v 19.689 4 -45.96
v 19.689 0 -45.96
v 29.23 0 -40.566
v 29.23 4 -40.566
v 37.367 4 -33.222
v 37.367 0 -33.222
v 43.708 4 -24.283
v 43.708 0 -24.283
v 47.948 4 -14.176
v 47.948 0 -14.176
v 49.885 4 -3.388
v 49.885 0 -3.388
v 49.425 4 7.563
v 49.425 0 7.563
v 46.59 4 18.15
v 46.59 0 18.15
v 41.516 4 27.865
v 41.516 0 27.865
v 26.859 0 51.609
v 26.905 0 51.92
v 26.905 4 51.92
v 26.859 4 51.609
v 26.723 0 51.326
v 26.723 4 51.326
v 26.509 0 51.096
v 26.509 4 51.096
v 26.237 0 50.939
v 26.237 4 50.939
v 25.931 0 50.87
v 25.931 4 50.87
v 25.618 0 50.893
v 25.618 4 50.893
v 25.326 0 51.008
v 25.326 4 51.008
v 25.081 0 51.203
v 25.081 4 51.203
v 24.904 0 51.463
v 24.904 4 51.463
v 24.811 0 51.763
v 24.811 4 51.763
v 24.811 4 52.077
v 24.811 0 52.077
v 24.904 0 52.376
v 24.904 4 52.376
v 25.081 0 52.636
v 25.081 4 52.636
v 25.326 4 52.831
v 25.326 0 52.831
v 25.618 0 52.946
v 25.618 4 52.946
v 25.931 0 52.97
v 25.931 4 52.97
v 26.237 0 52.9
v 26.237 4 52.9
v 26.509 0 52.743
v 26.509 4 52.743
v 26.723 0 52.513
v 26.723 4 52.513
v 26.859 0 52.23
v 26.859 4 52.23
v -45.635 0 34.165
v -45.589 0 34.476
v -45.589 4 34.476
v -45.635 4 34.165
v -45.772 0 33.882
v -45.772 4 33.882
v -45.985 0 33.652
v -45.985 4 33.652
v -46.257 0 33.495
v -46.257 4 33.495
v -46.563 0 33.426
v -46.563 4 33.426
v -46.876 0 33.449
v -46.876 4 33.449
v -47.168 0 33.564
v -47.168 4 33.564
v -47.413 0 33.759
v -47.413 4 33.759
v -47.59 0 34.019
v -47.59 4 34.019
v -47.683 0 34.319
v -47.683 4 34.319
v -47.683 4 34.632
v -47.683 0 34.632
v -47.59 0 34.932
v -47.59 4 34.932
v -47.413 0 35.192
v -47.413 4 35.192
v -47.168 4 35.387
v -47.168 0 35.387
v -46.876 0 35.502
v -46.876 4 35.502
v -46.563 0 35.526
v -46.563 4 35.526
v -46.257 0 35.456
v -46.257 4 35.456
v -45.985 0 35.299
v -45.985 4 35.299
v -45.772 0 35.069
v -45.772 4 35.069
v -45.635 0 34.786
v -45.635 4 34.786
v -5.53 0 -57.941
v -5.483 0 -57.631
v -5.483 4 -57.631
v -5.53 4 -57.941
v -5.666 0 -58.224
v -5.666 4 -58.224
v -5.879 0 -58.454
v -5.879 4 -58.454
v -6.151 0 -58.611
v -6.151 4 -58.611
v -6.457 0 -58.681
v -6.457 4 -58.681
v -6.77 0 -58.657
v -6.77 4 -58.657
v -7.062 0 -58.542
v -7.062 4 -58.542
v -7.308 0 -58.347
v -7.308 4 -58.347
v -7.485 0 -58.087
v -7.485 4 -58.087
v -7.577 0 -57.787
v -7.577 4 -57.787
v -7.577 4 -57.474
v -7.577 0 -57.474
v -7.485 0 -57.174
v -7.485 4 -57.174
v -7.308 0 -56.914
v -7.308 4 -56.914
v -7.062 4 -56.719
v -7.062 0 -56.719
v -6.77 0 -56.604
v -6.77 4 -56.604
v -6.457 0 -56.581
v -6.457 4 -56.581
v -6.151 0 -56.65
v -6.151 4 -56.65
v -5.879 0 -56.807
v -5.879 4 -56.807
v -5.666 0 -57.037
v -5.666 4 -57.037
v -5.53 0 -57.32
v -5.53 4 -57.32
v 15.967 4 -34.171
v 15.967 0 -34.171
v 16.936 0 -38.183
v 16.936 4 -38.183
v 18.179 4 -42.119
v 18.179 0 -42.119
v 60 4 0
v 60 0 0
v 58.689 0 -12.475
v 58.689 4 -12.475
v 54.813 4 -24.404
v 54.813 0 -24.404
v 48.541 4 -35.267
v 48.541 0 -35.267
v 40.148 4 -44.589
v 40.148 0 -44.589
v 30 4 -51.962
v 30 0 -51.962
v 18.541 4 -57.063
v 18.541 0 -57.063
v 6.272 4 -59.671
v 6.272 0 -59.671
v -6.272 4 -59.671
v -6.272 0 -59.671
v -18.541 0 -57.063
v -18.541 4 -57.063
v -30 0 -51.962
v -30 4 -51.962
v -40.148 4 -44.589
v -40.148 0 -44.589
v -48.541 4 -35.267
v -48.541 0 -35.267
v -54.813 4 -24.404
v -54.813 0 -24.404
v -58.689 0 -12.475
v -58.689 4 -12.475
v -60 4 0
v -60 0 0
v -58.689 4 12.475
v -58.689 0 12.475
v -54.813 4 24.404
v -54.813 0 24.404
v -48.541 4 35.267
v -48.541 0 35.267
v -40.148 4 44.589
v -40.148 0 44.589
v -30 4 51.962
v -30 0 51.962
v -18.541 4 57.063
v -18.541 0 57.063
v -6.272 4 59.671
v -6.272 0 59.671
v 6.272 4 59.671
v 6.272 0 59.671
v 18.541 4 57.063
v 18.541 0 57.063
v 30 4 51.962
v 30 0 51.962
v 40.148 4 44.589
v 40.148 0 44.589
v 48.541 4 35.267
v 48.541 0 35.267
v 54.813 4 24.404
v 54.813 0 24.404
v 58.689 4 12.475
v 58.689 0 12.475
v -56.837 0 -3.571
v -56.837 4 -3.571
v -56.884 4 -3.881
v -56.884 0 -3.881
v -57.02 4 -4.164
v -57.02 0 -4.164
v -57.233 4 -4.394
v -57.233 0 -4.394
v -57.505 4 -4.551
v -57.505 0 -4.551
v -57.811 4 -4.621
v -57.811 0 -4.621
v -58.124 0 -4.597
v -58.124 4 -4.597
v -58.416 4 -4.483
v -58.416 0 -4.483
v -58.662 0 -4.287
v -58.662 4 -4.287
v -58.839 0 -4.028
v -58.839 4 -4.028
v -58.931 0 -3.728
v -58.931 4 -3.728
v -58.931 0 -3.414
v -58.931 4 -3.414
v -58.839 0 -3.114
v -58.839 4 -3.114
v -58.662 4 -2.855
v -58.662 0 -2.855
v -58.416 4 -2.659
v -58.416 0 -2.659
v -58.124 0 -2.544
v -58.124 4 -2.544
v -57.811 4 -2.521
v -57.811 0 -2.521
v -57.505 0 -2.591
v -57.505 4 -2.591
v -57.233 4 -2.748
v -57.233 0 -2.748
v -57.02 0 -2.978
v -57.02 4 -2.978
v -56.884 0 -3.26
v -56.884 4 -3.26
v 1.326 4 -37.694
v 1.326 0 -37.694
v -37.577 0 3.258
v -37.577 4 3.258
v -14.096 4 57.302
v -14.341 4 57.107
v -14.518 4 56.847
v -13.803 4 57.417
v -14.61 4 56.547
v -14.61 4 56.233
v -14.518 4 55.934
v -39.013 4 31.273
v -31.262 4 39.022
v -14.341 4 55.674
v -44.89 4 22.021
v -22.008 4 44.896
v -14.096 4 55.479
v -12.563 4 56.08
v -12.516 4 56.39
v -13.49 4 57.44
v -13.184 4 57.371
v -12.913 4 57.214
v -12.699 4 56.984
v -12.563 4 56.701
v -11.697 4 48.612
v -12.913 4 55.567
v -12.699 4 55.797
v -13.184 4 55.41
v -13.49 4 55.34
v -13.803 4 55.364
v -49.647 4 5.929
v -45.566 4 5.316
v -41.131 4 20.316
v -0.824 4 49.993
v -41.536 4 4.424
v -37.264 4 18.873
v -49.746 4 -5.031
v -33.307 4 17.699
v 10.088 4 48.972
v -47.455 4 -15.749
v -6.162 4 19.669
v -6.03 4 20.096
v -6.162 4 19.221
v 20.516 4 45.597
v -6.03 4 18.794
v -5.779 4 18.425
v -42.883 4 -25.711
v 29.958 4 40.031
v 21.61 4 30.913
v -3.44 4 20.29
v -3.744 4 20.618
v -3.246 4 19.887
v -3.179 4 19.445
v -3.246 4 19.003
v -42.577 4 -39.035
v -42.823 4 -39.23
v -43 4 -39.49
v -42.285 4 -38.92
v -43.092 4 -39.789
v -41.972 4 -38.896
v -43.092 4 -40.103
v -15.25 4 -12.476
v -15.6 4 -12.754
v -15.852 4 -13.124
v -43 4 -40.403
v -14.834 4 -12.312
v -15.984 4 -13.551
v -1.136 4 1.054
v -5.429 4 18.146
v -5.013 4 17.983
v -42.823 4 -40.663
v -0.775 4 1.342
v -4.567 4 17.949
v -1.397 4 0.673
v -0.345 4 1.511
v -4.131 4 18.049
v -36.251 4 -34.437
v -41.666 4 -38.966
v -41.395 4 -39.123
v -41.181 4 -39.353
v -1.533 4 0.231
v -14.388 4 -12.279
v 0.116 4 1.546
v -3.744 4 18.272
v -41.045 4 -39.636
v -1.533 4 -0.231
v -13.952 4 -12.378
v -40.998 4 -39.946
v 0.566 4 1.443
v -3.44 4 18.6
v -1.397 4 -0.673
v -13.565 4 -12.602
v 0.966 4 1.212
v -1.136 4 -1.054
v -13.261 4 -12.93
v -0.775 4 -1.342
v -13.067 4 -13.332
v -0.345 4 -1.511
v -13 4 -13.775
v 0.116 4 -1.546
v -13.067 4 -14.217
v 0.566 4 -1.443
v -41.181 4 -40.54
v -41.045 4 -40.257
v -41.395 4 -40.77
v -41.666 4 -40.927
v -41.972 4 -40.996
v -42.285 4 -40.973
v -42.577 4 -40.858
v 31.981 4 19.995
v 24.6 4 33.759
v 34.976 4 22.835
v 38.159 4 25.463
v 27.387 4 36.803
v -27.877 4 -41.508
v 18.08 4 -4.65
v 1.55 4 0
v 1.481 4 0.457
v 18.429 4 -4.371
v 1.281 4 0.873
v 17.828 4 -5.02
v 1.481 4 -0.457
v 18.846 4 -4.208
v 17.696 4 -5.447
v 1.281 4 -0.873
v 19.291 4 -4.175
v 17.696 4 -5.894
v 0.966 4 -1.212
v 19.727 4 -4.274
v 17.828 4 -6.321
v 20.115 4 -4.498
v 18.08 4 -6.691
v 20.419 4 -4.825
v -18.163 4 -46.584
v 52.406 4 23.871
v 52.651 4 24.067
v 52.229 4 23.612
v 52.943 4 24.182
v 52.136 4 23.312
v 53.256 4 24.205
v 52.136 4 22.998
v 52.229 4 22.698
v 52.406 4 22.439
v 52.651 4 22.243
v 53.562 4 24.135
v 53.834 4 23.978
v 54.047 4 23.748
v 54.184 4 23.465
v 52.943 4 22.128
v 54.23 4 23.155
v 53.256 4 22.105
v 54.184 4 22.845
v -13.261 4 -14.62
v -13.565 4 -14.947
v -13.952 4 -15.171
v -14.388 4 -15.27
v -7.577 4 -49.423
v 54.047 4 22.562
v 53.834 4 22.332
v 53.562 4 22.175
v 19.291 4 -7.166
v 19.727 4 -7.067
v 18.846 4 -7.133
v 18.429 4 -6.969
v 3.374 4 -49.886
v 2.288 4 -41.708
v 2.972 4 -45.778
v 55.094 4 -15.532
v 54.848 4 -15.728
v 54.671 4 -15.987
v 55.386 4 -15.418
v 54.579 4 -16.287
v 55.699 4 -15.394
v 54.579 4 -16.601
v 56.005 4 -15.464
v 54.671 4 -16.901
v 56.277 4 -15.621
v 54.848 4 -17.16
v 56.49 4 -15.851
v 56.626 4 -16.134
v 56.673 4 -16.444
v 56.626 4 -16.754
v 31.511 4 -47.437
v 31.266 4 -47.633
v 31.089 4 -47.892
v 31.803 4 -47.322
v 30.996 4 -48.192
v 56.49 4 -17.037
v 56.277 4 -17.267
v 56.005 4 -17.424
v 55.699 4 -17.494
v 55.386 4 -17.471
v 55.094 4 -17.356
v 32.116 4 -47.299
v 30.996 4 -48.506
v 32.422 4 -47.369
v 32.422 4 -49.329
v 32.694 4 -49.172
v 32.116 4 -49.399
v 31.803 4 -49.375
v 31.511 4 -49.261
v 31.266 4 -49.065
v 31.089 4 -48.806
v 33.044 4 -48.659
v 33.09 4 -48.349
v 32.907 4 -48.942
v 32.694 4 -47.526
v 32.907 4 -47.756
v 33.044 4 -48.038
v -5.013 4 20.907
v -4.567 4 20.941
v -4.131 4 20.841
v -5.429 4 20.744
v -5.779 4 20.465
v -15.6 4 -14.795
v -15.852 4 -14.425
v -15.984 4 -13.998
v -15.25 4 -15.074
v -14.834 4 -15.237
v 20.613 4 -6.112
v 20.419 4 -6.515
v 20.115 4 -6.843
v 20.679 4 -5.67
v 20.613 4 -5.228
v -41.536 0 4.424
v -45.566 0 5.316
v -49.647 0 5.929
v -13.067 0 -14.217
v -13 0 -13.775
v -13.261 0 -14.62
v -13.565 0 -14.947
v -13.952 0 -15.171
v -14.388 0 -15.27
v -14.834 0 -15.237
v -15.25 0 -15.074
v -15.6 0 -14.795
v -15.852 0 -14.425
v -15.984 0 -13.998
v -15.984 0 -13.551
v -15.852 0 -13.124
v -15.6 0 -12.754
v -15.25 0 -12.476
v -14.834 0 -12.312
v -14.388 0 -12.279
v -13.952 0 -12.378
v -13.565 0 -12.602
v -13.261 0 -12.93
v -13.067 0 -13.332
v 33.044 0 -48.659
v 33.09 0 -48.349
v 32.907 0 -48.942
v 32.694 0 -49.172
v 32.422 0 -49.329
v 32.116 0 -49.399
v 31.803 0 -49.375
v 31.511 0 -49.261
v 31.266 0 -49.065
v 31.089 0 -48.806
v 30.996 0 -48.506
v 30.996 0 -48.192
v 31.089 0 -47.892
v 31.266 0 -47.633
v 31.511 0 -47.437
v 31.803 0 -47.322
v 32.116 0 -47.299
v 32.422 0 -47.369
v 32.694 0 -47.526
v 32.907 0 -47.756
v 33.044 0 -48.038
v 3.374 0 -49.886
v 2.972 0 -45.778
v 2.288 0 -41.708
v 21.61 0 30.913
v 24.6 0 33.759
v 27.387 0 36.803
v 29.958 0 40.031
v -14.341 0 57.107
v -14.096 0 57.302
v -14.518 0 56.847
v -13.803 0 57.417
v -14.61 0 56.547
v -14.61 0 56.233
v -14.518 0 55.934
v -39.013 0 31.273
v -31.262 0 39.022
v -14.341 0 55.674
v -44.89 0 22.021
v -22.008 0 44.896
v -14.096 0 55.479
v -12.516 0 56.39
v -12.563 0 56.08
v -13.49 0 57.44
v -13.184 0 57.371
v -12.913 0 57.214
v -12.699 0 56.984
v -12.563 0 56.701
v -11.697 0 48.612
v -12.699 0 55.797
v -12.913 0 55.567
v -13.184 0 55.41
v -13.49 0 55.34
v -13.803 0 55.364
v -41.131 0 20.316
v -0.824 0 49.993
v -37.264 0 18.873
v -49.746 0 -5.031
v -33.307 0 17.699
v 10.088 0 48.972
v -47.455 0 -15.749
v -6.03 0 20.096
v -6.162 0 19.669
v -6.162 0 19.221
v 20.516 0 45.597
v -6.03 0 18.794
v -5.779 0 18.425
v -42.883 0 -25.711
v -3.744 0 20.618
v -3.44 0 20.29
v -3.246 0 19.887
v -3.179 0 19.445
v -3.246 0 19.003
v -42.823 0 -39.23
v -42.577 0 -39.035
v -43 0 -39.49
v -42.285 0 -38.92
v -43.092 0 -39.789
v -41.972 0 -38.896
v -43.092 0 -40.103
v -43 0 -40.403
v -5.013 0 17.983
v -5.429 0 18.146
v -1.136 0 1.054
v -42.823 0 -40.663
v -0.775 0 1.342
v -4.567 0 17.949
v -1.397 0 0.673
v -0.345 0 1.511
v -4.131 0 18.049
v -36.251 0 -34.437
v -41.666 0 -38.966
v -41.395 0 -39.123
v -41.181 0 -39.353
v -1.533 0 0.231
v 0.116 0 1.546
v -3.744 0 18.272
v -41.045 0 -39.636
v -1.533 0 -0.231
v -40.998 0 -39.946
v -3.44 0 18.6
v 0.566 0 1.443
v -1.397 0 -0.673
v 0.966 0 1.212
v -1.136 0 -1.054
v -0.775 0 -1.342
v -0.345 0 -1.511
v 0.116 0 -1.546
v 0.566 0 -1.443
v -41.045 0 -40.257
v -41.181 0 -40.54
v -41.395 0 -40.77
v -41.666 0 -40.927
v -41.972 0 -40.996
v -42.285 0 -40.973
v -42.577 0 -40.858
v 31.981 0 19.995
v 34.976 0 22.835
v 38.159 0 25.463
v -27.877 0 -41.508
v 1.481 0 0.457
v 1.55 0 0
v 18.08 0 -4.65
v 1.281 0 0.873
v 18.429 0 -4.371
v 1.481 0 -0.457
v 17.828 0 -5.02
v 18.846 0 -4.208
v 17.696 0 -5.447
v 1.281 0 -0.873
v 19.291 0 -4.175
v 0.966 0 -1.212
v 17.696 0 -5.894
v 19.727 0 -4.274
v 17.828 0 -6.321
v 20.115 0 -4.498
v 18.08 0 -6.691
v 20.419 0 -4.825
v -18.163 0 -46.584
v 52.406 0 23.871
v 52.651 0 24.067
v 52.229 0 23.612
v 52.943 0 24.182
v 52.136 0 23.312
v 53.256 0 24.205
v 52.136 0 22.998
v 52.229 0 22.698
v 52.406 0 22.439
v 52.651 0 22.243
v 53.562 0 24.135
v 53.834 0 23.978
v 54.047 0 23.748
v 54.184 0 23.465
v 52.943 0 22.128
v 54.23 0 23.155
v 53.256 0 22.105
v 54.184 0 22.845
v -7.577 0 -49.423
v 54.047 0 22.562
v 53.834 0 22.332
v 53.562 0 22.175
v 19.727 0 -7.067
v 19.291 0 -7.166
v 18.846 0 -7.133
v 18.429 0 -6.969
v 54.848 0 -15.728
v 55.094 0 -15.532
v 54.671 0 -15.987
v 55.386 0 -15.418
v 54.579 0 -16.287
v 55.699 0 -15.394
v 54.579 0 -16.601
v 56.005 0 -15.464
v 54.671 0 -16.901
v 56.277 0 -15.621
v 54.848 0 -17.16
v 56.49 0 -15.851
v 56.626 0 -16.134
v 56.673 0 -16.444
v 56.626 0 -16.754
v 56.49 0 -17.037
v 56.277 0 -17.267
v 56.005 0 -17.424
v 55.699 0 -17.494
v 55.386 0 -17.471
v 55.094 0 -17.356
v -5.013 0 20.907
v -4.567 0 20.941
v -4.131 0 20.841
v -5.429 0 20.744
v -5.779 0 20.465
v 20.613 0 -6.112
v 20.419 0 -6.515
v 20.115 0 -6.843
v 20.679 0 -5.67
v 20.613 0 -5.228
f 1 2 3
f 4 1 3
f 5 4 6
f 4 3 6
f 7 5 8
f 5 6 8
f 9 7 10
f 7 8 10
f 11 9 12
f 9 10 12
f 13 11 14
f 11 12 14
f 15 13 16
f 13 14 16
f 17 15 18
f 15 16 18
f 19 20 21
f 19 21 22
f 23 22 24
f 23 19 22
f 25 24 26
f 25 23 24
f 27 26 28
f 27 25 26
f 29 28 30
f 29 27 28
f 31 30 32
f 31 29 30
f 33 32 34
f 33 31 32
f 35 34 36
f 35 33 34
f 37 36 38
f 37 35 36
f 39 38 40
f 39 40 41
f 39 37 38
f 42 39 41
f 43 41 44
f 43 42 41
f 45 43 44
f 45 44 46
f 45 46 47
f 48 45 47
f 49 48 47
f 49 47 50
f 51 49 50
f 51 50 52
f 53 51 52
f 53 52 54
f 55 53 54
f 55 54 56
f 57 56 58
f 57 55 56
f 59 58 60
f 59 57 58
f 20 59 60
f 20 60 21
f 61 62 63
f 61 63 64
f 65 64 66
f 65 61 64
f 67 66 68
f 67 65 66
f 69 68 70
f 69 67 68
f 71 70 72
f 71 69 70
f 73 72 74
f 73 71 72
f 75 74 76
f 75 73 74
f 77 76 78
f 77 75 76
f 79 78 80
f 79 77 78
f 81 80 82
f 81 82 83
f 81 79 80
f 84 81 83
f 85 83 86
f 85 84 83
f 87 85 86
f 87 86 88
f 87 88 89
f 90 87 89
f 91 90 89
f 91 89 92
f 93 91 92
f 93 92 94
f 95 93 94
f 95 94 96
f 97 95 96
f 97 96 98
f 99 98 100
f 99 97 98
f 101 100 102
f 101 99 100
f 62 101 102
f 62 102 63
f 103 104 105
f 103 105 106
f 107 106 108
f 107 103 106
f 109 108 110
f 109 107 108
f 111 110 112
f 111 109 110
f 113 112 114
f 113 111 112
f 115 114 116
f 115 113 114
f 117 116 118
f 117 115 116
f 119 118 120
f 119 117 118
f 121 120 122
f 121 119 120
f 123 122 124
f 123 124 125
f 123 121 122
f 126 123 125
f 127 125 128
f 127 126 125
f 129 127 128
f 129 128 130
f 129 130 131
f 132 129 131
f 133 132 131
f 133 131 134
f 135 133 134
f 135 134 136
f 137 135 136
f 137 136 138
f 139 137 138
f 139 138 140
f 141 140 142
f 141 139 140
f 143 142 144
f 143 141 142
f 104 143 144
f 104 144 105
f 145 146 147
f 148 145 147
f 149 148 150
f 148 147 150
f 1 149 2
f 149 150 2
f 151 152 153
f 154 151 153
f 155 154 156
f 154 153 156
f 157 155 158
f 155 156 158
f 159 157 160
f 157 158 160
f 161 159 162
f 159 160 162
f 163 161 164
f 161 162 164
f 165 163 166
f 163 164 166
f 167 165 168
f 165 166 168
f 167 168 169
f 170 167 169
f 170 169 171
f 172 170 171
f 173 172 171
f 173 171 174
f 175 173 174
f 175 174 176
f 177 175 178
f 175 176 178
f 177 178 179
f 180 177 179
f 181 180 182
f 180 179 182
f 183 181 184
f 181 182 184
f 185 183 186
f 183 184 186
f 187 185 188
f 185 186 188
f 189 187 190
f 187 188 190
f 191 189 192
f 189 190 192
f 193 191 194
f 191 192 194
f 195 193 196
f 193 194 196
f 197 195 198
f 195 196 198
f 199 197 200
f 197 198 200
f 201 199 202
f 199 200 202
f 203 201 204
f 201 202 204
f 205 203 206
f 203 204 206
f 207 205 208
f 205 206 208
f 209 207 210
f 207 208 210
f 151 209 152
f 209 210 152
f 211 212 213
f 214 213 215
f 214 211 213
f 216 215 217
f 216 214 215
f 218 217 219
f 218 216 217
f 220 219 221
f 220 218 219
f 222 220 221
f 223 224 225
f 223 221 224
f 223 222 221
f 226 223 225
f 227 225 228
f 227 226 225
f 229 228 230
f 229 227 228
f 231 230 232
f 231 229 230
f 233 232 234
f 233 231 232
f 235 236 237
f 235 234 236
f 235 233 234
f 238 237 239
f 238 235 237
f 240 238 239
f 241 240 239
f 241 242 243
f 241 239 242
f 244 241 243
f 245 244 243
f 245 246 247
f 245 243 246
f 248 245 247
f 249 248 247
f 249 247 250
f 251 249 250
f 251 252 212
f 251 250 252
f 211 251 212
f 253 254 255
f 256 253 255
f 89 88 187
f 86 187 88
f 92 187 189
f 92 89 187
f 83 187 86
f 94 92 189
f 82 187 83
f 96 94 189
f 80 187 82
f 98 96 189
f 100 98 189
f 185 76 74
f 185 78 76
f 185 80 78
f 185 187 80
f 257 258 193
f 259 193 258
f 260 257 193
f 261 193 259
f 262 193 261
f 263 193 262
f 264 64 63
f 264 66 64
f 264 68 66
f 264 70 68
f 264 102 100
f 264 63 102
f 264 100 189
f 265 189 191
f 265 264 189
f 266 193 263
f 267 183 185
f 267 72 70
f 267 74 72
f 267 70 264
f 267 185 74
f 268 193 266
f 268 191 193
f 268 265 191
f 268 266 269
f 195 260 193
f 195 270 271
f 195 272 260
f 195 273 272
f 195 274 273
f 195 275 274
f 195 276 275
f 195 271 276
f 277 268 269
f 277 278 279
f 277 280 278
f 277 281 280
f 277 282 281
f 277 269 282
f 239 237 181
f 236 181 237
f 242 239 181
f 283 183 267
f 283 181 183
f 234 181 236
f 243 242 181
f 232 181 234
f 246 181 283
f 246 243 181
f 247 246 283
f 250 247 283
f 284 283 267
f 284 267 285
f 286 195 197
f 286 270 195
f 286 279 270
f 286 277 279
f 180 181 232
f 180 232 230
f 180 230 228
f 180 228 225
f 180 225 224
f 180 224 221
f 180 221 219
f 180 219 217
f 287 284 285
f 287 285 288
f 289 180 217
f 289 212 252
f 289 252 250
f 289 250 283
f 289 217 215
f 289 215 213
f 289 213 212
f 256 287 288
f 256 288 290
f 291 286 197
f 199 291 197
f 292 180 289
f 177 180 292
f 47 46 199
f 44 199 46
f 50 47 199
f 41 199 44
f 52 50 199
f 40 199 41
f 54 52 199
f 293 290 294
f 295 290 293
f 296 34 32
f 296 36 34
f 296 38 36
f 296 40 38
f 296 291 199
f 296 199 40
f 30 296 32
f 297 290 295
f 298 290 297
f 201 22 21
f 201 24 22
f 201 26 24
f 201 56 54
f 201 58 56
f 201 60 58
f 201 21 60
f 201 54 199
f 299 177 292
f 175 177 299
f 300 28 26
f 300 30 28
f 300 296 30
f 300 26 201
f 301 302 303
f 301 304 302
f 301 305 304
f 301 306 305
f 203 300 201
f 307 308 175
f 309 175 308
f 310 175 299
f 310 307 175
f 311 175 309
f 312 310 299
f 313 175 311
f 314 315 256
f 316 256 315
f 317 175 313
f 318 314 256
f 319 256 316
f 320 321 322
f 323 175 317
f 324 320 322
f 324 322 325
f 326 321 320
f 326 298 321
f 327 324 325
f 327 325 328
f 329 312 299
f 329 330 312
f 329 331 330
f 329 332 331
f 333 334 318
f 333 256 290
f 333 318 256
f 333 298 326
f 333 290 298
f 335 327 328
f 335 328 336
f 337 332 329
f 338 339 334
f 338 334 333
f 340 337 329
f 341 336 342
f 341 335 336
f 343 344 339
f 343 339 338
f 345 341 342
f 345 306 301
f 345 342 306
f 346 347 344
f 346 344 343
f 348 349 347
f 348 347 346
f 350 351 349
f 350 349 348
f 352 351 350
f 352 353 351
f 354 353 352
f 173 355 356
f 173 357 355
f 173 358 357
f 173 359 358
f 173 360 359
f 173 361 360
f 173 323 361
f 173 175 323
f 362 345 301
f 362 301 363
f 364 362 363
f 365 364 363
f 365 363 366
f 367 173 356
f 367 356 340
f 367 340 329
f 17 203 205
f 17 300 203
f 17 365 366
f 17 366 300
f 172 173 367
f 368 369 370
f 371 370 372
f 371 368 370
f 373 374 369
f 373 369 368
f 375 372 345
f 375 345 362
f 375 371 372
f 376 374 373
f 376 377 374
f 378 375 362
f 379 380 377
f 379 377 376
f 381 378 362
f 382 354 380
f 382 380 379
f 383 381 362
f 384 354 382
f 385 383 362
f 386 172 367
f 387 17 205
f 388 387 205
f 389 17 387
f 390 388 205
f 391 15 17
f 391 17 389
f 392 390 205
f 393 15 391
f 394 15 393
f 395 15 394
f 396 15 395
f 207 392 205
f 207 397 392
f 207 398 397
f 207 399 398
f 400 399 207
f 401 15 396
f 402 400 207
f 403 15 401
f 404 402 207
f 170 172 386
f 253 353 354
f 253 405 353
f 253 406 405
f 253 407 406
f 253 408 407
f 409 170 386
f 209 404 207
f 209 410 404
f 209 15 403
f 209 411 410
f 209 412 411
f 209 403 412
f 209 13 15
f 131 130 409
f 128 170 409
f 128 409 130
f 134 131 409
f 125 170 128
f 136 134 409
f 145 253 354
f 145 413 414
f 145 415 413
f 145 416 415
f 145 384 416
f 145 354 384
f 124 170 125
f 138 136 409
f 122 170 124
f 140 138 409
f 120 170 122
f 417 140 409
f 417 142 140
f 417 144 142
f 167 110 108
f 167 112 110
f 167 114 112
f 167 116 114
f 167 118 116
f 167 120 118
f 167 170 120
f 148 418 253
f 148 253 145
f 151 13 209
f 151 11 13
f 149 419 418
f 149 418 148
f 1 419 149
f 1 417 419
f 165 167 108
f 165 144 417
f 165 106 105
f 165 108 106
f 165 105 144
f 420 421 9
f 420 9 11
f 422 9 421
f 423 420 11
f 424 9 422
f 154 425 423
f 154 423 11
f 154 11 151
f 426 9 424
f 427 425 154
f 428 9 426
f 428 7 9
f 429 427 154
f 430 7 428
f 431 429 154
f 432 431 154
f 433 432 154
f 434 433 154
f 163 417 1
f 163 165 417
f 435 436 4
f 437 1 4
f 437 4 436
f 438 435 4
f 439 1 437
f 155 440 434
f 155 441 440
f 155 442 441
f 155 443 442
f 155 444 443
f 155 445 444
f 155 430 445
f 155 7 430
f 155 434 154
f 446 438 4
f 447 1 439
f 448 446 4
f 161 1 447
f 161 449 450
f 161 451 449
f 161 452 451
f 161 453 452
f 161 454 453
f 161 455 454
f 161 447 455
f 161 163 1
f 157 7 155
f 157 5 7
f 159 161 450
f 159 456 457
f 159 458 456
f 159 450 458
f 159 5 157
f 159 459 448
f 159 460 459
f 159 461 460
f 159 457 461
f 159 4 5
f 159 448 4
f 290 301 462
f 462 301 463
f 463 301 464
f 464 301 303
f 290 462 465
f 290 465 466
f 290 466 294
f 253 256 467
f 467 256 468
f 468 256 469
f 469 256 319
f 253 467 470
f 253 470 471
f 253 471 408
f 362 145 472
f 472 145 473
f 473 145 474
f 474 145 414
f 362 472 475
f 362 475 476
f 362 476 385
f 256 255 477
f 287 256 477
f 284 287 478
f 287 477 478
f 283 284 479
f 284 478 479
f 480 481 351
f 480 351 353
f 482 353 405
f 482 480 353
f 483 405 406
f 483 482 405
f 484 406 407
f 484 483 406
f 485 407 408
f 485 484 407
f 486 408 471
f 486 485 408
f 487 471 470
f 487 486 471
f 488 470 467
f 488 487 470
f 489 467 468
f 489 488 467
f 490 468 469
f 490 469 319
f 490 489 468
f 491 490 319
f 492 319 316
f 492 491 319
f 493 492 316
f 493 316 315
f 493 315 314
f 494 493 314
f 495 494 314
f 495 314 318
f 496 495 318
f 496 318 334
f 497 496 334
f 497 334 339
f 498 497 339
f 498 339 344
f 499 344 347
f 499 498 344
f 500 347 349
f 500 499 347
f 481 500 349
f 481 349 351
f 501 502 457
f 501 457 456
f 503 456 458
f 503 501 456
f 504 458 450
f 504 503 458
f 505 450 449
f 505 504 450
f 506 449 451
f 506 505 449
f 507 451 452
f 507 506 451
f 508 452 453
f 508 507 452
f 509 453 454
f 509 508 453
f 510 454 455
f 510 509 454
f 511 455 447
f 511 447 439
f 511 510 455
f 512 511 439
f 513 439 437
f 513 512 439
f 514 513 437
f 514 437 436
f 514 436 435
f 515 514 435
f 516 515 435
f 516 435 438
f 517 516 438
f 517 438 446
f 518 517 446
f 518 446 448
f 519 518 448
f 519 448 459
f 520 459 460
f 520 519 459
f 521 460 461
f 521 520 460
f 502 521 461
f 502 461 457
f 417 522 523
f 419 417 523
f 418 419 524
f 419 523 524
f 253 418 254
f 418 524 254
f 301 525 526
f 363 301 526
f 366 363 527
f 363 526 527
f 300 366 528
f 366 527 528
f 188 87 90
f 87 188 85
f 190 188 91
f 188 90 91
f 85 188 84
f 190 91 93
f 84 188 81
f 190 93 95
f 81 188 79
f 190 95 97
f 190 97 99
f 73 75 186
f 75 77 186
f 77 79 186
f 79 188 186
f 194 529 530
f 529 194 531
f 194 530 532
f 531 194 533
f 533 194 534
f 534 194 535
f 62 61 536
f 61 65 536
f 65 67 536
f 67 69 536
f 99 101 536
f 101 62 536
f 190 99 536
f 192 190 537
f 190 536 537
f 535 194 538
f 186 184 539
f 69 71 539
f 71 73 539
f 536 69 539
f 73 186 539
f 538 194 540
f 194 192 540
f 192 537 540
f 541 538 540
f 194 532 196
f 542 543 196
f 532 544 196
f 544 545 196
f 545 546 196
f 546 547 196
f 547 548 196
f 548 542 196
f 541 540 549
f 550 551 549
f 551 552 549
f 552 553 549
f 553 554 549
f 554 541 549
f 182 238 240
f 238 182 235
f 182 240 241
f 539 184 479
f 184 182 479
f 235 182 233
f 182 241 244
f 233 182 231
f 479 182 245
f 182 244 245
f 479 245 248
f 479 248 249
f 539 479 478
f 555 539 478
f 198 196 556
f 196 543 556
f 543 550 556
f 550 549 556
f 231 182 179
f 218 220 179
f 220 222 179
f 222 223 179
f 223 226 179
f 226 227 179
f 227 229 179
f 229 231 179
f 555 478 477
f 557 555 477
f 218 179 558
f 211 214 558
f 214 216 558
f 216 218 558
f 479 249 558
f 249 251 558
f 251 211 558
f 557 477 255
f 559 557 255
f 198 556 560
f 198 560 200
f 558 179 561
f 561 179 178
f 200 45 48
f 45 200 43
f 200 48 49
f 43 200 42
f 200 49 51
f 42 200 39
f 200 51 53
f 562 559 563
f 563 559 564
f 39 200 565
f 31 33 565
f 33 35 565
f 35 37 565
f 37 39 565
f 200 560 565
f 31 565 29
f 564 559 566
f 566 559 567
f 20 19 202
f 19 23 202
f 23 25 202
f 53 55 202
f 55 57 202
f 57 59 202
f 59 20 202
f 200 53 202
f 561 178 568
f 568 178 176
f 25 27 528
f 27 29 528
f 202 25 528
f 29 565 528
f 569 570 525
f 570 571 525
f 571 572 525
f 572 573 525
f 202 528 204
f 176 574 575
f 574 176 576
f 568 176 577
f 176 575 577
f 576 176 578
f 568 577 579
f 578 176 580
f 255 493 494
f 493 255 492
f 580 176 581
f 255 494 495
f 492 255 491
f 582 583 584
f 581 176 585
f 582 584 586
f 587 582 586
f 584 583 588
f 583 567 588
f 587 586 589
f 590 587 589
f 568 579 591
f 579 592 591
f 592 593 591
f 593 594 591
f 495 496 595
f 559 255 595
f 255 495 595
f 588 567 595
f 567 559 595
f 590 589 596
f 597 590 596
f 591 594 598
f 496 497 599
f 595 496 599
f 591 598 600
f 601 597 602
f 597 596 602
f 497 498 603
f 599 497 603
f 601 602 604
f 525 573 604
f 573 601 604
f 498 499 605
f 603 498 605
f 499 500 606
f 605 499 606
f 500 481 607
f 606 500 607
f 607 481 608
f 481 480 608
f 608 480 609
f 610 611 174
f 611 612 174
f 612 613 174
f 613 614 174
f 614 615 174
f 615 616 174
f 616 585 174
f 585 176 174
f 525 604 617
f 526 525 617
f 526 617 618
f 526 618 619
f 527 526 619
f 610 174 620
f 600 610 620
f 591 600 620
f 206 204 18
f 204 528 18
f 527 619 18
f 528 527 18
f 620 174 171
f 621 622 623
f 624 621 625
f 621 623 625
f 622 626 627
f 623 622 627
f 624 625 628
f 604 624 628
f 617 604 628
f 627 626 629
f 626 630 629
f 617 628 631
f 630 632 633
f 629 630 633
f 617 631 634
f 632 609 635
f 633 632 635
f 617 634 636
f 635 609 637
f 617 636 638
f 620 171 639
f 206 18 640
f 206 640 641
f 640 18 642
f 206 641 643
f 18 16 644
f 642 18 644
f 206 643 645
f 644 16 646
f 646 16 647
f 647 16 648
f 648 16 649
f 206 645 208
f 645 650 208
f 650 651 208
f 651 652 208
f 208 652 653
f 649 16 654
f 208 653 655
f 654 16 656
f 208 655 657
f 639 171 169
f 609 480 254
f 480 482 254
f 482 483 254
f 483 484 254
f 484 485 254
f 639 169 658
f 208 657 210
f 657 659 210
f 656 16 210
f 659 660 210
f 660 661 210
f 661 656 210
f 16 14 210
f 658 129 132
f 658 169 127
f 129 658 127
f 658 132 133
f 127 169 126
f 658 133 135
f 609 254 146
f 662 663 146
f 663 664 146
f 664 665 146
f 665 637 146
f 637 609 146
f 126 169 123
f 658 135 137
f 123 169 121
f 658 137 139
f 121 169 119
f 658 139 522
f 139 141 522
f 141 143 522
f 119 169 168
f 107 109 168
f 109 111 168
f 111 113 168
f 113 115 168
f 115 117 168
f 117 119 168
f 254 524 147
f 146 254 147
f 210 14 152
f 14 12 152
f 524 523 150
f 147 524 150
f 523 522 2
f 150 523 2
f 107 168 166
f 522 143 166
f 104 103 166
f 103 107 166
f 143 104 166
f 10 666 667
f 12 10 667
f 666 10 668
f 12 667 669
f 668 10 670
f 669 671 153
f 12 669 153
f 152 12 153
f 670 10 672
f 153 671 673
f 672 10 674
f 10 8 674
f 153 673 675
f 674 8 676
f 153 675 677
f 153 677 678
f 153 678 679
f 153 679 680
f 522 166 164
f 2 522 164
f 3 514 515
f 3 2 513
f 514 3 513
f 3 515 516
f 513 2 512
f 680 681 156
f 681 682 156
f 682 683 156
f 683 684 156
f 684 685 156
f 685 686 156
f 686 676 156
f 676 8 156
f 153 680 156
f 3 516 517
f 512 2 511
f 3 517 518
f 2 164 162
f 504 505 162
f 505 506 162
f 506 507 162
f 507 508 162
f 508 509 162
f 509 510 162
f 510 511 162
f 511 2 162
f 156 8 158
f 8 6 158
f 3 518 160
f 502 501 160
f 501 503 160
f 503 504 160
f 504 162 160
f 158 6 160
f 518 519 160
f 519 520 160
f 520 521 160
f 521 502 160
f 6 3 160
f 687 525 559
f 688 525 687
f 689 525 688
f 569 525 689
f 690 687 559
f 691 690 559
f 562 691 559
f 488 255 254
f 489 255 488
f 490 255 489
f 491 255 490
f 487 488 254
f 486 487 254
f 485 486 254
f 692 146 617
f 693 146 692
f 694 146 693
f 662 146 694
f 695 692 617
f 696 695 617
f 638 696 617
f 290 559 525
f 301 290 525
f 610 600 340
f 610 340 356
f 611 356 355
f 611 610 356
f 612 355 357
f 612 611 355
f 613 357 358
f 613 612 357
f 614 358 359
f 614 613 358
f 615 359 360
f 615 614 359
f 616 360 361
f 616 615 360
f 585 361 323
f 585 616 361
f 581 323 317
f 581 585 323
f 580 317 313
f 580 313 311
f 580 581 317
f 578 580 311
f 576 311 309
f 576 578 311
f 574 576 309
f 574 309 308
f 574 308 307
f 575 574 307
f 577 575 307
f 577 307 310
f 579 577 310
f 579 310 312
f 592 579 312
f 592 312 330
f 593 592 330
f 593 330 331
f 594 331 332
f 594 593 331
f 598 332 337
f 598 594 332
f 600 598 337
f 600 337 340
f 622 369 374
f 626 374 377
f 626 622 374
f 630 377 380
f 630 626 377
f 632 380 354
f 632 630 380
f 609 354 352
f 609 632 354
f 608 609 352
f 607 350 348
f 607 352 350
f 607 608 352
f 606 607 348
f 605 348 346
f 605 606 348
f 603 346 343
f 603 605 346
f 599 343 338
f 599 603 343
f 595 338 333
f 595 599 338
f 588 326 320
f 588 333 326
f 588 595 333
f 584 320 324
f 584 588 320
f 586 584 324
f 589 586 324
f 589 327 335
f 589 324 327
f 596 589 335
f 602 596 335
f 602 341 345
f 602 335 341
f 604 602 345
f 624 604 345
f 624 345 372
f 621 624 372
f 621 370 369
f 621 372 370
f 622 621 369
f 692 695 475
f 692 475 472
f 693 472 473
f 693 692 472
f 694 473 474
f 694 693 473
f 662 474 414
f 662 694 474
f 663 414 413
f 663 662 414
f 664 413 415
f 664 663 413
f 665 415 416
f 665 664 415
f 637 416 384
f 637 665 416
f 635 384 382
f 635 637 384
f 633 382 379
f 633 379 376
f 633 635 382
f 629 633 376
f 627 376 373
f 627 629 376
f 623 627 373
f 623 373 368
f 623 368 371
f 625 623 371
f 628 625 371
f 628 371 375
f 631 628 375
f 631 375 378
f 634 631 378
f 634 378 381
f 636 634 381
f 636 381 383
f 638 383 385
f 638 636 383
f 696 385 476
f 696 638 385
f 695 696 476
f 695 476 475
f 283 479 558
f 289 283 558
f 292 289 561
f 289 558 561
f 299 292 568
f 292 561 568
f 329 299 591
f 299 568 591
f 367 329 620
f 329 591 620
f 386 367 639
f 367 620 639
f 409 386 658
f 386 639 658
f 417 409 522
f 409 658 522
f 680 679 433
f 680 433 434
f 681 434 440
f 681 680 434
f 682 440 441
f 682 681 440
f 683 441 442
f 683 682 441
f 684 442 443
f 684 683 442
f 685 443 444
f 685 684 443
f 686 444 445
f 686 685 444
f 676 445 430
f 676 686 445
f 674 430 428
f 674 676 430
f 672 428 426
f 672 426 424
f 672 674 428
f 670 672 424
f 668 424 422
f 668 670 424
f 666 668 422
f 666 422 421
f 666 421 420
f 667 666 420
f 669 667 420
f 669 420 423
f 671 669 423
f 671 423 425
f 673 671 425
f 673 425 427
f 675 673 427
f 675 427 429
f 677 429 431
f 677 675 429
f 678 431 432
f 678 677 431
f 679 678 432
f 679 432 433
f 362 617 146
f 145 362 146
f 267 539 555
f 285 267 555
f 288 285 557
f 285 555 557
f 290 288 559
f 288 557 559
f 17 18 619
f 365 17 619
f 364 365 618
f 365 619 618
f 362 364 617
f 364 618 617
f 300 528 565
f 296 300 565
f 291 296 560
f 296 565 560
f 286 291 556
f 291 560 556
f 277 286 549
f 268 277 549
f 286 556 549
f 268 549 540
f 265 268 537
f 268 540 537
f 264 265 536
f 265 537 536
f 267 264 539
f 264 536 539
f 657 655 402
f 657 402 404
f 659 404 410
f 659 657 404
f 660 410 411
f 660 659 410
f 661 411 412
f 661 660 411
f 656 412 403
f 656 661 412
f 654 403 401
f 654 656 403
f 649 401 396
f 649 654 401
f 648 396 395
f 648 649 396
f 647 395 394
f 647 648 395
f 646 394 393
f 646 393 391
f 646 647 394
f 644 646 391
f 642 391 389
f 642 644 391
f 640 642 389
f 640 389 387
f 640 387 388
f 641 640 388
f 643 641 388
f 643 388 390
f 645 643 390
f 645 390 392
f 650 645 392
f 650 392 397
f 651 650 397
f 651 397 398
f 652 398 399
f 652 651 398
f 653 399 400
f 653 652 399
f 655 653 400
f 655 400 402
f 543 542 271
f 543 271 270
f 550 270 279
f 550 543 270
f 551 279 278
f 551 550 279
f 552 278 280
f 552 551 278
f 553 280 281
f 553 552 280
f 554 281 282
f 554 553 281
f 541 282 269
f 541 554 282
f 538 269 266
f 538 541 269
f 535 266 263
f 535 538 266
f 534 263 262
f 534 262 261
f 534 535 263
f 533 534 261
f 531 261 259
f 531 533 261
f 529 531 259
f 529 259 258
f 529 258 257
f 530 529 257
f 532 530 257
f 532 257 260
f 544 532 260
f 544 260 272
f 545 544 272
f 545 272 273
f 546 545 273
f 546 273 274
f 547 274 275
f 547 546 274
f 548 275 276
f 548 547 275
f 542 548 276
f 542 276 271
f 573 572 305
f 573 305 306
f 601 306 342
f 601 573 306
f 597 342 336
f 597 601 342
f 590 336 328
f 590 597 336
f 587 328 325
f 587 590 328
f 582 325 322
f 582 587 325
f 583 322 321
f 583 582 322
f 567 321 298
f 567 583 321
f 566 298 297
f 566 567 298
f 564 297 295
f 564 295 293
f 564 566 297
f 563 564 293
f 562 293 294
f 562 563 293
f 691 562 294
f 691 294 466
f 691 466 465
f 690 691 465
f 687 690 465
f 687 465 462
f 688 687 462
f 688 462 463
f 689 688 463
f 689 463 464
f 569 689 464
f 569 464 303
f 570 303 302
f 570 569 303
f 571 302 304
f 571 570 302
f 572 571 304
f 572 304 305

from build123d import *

# Parameters (mm, degrees)
SKETCH_3_R           = 60
SKETCH_3_R_2         = 1.052935028
SKETCH_3_R_3         = 1.5
EXTRUDE_4_DEPTH      = 4
CUT_EXTRUDE_15_DEPTH = 4
SKETCH_3_22_R        = 1.55
CUT_EXTRUDE_23_DEPTH = 10
SKETCH_3_23_R        = 1.052935028
CUT_EXTRUDE_24_DEPTH = 10


with BuildPart() as part:
    # 草图3 → 凸台-拉伸4 (new body)
    with BuildSketch(Plane(origin=(0, 0, 0), x_dir=(1, 0, 0), z_dir=(0, 1, 0))):
        Circle(SKETCH_3_R)
        with Locations((-46.641583195, -34.475537952)):
            Circle(SKETCH_3_R_2, mode=Mode.SUBTRACT)
        with Locations((-13.569076992, -56.390426045)):
            Circle(SKETCH_3_R_2, mode=Mode.SUBTRACT)
        with BuildLine():
            ThreePointArc((-44.889569885, -22.021047103), (-39.209954392, -19.560908928), (-33.307112163, -17.698983687))
            Line((-33.307112163, -17.698983687), (21.609631998, -30.913452559))
            ThreePointArc((21.609631998, -30.913452559), (26.019303967, -35.256850436), (29.958048994, -40.031428909))
            ThreePointArc((29.958048994, -40.031428909), (-11.697480165, -48.612436246), (-44.889569885, -22.021047103))
        make_face(mode=Mode.SUBTRACT)
        with Locations((-4.678992066, -19.444974498)):
            Circle(SKETCH_3_R_3, mode=Mode.SUBTRACT)
        with Locations((25.852551139, -51.919607083)):
            Circle(SKETCH_3_R_2, mode=Mode.SUBTRACT)
        with Locations((53.177483273, -23.155026944)):
            Circle(SKETCH_3_R_2, mode=Mode.SUBTRACT)
        with Locations((-14.500345858, 13.774613243)):
            Circle(SKETCH_3_R_3, mode=Mode.SUBTRACT)
        with BuildLine():
            ThreePointArc((15.967019236, 34.171216556), (17.523676152, 40.161803442), (19.689209887, 45.960145931))
            ThreePointArc((19.689209887, 45.960145931), (47.948344812, 14.175903139), (41.515571152, -27.864984334))
            ThreePointArc((41.515571152, -27.864984334), (36.545221249, -24.176362121), (31.981325576, -19.995313417))
            Line((31.981325576, -19.995313417), (15.967019236, 34.171216556))
        make_face(mode=Mode.SUBTRACT)
        with Locations((55.620079982, 16.444047642)):
            Circle(SKETCH_3_R_2, mode=Mode.SUBTRACT)
        with Locations((32.037423118, 48.34876958)):
            Circle(SKETCH_3_R_2, mode=Mode.SUBTRACT)
        with Locations((-42.05100299, 39.946378404)):
            Circle(SKETCH_3_R_2, mode=Mode.SUBTRACT)
        with Locations((-6.535900078, 57.630564895)):
            Circle(SKETCH_3_R_2, mode=Mode.SUBTRACT)
        with Locations((19.179337925, 5.670361256)):
            Circle(SKETCH_3_R_3, mode=Mode.SUBTRACT)
    extrude(amount=EXTRUDE_4_DEPTH)

    # 草图3<17> → 切除-拉伸15 (cut)
    with BuildSketch(Plane(origin=(0, 0, 0), x_dir=(1, 0, 0), z_dir=(0, 1, 0))):
        with BuildLine():
            Line((1.325786588, 37.694297104), (-37.576651234, -3.257763997))
            ThreePointArc((-37.576651234, -3.257763997), (-43.542980118, -4.904953006), (-49.647258882, -5.928717023))
            ThreePointArc((-49.647258882, -5.928717023), (-36.250864646, 34.436533107), (3.373998733, 49.886031437))
            ThreePointArc((3.373998733, 49.886031437), (2.664733143, 43.737271049), (1.325786588, 37.694297104))
        make_face()
    extrude(amount=CUT_EXTRUDE_15_DEPTH, mode=Mode.SUBTRACT)

    # 草图3<22> → 切除-拉伸23 (cut)
    with BuildSketch(Plane(origin=(0, 0, 0), x_dir=(1, 0, 0), z_dir=(0, 1, 0))):
        Circle(SKETCH_3_22_R)
    extrude(amount=CUT_EXTRUDE_23_DEPTH, mode=Mode.SUBTRACT)

    # 草图3<23> → 切除-拉伸24 (cut)
    with BuildSketch(Plane(origin=(0, 0, 0), x_dir=(1, 0, 0), z_dir=(0, 1, 0))):
        with Locations((-57.889974257, 3.570837502)):
            Circle(SKETCH_3_23_R)
    extrude(amount=CUT_EXTRUDE_24_DEPTH, mode=Mode.SUBTRACT)


solid = part.part
